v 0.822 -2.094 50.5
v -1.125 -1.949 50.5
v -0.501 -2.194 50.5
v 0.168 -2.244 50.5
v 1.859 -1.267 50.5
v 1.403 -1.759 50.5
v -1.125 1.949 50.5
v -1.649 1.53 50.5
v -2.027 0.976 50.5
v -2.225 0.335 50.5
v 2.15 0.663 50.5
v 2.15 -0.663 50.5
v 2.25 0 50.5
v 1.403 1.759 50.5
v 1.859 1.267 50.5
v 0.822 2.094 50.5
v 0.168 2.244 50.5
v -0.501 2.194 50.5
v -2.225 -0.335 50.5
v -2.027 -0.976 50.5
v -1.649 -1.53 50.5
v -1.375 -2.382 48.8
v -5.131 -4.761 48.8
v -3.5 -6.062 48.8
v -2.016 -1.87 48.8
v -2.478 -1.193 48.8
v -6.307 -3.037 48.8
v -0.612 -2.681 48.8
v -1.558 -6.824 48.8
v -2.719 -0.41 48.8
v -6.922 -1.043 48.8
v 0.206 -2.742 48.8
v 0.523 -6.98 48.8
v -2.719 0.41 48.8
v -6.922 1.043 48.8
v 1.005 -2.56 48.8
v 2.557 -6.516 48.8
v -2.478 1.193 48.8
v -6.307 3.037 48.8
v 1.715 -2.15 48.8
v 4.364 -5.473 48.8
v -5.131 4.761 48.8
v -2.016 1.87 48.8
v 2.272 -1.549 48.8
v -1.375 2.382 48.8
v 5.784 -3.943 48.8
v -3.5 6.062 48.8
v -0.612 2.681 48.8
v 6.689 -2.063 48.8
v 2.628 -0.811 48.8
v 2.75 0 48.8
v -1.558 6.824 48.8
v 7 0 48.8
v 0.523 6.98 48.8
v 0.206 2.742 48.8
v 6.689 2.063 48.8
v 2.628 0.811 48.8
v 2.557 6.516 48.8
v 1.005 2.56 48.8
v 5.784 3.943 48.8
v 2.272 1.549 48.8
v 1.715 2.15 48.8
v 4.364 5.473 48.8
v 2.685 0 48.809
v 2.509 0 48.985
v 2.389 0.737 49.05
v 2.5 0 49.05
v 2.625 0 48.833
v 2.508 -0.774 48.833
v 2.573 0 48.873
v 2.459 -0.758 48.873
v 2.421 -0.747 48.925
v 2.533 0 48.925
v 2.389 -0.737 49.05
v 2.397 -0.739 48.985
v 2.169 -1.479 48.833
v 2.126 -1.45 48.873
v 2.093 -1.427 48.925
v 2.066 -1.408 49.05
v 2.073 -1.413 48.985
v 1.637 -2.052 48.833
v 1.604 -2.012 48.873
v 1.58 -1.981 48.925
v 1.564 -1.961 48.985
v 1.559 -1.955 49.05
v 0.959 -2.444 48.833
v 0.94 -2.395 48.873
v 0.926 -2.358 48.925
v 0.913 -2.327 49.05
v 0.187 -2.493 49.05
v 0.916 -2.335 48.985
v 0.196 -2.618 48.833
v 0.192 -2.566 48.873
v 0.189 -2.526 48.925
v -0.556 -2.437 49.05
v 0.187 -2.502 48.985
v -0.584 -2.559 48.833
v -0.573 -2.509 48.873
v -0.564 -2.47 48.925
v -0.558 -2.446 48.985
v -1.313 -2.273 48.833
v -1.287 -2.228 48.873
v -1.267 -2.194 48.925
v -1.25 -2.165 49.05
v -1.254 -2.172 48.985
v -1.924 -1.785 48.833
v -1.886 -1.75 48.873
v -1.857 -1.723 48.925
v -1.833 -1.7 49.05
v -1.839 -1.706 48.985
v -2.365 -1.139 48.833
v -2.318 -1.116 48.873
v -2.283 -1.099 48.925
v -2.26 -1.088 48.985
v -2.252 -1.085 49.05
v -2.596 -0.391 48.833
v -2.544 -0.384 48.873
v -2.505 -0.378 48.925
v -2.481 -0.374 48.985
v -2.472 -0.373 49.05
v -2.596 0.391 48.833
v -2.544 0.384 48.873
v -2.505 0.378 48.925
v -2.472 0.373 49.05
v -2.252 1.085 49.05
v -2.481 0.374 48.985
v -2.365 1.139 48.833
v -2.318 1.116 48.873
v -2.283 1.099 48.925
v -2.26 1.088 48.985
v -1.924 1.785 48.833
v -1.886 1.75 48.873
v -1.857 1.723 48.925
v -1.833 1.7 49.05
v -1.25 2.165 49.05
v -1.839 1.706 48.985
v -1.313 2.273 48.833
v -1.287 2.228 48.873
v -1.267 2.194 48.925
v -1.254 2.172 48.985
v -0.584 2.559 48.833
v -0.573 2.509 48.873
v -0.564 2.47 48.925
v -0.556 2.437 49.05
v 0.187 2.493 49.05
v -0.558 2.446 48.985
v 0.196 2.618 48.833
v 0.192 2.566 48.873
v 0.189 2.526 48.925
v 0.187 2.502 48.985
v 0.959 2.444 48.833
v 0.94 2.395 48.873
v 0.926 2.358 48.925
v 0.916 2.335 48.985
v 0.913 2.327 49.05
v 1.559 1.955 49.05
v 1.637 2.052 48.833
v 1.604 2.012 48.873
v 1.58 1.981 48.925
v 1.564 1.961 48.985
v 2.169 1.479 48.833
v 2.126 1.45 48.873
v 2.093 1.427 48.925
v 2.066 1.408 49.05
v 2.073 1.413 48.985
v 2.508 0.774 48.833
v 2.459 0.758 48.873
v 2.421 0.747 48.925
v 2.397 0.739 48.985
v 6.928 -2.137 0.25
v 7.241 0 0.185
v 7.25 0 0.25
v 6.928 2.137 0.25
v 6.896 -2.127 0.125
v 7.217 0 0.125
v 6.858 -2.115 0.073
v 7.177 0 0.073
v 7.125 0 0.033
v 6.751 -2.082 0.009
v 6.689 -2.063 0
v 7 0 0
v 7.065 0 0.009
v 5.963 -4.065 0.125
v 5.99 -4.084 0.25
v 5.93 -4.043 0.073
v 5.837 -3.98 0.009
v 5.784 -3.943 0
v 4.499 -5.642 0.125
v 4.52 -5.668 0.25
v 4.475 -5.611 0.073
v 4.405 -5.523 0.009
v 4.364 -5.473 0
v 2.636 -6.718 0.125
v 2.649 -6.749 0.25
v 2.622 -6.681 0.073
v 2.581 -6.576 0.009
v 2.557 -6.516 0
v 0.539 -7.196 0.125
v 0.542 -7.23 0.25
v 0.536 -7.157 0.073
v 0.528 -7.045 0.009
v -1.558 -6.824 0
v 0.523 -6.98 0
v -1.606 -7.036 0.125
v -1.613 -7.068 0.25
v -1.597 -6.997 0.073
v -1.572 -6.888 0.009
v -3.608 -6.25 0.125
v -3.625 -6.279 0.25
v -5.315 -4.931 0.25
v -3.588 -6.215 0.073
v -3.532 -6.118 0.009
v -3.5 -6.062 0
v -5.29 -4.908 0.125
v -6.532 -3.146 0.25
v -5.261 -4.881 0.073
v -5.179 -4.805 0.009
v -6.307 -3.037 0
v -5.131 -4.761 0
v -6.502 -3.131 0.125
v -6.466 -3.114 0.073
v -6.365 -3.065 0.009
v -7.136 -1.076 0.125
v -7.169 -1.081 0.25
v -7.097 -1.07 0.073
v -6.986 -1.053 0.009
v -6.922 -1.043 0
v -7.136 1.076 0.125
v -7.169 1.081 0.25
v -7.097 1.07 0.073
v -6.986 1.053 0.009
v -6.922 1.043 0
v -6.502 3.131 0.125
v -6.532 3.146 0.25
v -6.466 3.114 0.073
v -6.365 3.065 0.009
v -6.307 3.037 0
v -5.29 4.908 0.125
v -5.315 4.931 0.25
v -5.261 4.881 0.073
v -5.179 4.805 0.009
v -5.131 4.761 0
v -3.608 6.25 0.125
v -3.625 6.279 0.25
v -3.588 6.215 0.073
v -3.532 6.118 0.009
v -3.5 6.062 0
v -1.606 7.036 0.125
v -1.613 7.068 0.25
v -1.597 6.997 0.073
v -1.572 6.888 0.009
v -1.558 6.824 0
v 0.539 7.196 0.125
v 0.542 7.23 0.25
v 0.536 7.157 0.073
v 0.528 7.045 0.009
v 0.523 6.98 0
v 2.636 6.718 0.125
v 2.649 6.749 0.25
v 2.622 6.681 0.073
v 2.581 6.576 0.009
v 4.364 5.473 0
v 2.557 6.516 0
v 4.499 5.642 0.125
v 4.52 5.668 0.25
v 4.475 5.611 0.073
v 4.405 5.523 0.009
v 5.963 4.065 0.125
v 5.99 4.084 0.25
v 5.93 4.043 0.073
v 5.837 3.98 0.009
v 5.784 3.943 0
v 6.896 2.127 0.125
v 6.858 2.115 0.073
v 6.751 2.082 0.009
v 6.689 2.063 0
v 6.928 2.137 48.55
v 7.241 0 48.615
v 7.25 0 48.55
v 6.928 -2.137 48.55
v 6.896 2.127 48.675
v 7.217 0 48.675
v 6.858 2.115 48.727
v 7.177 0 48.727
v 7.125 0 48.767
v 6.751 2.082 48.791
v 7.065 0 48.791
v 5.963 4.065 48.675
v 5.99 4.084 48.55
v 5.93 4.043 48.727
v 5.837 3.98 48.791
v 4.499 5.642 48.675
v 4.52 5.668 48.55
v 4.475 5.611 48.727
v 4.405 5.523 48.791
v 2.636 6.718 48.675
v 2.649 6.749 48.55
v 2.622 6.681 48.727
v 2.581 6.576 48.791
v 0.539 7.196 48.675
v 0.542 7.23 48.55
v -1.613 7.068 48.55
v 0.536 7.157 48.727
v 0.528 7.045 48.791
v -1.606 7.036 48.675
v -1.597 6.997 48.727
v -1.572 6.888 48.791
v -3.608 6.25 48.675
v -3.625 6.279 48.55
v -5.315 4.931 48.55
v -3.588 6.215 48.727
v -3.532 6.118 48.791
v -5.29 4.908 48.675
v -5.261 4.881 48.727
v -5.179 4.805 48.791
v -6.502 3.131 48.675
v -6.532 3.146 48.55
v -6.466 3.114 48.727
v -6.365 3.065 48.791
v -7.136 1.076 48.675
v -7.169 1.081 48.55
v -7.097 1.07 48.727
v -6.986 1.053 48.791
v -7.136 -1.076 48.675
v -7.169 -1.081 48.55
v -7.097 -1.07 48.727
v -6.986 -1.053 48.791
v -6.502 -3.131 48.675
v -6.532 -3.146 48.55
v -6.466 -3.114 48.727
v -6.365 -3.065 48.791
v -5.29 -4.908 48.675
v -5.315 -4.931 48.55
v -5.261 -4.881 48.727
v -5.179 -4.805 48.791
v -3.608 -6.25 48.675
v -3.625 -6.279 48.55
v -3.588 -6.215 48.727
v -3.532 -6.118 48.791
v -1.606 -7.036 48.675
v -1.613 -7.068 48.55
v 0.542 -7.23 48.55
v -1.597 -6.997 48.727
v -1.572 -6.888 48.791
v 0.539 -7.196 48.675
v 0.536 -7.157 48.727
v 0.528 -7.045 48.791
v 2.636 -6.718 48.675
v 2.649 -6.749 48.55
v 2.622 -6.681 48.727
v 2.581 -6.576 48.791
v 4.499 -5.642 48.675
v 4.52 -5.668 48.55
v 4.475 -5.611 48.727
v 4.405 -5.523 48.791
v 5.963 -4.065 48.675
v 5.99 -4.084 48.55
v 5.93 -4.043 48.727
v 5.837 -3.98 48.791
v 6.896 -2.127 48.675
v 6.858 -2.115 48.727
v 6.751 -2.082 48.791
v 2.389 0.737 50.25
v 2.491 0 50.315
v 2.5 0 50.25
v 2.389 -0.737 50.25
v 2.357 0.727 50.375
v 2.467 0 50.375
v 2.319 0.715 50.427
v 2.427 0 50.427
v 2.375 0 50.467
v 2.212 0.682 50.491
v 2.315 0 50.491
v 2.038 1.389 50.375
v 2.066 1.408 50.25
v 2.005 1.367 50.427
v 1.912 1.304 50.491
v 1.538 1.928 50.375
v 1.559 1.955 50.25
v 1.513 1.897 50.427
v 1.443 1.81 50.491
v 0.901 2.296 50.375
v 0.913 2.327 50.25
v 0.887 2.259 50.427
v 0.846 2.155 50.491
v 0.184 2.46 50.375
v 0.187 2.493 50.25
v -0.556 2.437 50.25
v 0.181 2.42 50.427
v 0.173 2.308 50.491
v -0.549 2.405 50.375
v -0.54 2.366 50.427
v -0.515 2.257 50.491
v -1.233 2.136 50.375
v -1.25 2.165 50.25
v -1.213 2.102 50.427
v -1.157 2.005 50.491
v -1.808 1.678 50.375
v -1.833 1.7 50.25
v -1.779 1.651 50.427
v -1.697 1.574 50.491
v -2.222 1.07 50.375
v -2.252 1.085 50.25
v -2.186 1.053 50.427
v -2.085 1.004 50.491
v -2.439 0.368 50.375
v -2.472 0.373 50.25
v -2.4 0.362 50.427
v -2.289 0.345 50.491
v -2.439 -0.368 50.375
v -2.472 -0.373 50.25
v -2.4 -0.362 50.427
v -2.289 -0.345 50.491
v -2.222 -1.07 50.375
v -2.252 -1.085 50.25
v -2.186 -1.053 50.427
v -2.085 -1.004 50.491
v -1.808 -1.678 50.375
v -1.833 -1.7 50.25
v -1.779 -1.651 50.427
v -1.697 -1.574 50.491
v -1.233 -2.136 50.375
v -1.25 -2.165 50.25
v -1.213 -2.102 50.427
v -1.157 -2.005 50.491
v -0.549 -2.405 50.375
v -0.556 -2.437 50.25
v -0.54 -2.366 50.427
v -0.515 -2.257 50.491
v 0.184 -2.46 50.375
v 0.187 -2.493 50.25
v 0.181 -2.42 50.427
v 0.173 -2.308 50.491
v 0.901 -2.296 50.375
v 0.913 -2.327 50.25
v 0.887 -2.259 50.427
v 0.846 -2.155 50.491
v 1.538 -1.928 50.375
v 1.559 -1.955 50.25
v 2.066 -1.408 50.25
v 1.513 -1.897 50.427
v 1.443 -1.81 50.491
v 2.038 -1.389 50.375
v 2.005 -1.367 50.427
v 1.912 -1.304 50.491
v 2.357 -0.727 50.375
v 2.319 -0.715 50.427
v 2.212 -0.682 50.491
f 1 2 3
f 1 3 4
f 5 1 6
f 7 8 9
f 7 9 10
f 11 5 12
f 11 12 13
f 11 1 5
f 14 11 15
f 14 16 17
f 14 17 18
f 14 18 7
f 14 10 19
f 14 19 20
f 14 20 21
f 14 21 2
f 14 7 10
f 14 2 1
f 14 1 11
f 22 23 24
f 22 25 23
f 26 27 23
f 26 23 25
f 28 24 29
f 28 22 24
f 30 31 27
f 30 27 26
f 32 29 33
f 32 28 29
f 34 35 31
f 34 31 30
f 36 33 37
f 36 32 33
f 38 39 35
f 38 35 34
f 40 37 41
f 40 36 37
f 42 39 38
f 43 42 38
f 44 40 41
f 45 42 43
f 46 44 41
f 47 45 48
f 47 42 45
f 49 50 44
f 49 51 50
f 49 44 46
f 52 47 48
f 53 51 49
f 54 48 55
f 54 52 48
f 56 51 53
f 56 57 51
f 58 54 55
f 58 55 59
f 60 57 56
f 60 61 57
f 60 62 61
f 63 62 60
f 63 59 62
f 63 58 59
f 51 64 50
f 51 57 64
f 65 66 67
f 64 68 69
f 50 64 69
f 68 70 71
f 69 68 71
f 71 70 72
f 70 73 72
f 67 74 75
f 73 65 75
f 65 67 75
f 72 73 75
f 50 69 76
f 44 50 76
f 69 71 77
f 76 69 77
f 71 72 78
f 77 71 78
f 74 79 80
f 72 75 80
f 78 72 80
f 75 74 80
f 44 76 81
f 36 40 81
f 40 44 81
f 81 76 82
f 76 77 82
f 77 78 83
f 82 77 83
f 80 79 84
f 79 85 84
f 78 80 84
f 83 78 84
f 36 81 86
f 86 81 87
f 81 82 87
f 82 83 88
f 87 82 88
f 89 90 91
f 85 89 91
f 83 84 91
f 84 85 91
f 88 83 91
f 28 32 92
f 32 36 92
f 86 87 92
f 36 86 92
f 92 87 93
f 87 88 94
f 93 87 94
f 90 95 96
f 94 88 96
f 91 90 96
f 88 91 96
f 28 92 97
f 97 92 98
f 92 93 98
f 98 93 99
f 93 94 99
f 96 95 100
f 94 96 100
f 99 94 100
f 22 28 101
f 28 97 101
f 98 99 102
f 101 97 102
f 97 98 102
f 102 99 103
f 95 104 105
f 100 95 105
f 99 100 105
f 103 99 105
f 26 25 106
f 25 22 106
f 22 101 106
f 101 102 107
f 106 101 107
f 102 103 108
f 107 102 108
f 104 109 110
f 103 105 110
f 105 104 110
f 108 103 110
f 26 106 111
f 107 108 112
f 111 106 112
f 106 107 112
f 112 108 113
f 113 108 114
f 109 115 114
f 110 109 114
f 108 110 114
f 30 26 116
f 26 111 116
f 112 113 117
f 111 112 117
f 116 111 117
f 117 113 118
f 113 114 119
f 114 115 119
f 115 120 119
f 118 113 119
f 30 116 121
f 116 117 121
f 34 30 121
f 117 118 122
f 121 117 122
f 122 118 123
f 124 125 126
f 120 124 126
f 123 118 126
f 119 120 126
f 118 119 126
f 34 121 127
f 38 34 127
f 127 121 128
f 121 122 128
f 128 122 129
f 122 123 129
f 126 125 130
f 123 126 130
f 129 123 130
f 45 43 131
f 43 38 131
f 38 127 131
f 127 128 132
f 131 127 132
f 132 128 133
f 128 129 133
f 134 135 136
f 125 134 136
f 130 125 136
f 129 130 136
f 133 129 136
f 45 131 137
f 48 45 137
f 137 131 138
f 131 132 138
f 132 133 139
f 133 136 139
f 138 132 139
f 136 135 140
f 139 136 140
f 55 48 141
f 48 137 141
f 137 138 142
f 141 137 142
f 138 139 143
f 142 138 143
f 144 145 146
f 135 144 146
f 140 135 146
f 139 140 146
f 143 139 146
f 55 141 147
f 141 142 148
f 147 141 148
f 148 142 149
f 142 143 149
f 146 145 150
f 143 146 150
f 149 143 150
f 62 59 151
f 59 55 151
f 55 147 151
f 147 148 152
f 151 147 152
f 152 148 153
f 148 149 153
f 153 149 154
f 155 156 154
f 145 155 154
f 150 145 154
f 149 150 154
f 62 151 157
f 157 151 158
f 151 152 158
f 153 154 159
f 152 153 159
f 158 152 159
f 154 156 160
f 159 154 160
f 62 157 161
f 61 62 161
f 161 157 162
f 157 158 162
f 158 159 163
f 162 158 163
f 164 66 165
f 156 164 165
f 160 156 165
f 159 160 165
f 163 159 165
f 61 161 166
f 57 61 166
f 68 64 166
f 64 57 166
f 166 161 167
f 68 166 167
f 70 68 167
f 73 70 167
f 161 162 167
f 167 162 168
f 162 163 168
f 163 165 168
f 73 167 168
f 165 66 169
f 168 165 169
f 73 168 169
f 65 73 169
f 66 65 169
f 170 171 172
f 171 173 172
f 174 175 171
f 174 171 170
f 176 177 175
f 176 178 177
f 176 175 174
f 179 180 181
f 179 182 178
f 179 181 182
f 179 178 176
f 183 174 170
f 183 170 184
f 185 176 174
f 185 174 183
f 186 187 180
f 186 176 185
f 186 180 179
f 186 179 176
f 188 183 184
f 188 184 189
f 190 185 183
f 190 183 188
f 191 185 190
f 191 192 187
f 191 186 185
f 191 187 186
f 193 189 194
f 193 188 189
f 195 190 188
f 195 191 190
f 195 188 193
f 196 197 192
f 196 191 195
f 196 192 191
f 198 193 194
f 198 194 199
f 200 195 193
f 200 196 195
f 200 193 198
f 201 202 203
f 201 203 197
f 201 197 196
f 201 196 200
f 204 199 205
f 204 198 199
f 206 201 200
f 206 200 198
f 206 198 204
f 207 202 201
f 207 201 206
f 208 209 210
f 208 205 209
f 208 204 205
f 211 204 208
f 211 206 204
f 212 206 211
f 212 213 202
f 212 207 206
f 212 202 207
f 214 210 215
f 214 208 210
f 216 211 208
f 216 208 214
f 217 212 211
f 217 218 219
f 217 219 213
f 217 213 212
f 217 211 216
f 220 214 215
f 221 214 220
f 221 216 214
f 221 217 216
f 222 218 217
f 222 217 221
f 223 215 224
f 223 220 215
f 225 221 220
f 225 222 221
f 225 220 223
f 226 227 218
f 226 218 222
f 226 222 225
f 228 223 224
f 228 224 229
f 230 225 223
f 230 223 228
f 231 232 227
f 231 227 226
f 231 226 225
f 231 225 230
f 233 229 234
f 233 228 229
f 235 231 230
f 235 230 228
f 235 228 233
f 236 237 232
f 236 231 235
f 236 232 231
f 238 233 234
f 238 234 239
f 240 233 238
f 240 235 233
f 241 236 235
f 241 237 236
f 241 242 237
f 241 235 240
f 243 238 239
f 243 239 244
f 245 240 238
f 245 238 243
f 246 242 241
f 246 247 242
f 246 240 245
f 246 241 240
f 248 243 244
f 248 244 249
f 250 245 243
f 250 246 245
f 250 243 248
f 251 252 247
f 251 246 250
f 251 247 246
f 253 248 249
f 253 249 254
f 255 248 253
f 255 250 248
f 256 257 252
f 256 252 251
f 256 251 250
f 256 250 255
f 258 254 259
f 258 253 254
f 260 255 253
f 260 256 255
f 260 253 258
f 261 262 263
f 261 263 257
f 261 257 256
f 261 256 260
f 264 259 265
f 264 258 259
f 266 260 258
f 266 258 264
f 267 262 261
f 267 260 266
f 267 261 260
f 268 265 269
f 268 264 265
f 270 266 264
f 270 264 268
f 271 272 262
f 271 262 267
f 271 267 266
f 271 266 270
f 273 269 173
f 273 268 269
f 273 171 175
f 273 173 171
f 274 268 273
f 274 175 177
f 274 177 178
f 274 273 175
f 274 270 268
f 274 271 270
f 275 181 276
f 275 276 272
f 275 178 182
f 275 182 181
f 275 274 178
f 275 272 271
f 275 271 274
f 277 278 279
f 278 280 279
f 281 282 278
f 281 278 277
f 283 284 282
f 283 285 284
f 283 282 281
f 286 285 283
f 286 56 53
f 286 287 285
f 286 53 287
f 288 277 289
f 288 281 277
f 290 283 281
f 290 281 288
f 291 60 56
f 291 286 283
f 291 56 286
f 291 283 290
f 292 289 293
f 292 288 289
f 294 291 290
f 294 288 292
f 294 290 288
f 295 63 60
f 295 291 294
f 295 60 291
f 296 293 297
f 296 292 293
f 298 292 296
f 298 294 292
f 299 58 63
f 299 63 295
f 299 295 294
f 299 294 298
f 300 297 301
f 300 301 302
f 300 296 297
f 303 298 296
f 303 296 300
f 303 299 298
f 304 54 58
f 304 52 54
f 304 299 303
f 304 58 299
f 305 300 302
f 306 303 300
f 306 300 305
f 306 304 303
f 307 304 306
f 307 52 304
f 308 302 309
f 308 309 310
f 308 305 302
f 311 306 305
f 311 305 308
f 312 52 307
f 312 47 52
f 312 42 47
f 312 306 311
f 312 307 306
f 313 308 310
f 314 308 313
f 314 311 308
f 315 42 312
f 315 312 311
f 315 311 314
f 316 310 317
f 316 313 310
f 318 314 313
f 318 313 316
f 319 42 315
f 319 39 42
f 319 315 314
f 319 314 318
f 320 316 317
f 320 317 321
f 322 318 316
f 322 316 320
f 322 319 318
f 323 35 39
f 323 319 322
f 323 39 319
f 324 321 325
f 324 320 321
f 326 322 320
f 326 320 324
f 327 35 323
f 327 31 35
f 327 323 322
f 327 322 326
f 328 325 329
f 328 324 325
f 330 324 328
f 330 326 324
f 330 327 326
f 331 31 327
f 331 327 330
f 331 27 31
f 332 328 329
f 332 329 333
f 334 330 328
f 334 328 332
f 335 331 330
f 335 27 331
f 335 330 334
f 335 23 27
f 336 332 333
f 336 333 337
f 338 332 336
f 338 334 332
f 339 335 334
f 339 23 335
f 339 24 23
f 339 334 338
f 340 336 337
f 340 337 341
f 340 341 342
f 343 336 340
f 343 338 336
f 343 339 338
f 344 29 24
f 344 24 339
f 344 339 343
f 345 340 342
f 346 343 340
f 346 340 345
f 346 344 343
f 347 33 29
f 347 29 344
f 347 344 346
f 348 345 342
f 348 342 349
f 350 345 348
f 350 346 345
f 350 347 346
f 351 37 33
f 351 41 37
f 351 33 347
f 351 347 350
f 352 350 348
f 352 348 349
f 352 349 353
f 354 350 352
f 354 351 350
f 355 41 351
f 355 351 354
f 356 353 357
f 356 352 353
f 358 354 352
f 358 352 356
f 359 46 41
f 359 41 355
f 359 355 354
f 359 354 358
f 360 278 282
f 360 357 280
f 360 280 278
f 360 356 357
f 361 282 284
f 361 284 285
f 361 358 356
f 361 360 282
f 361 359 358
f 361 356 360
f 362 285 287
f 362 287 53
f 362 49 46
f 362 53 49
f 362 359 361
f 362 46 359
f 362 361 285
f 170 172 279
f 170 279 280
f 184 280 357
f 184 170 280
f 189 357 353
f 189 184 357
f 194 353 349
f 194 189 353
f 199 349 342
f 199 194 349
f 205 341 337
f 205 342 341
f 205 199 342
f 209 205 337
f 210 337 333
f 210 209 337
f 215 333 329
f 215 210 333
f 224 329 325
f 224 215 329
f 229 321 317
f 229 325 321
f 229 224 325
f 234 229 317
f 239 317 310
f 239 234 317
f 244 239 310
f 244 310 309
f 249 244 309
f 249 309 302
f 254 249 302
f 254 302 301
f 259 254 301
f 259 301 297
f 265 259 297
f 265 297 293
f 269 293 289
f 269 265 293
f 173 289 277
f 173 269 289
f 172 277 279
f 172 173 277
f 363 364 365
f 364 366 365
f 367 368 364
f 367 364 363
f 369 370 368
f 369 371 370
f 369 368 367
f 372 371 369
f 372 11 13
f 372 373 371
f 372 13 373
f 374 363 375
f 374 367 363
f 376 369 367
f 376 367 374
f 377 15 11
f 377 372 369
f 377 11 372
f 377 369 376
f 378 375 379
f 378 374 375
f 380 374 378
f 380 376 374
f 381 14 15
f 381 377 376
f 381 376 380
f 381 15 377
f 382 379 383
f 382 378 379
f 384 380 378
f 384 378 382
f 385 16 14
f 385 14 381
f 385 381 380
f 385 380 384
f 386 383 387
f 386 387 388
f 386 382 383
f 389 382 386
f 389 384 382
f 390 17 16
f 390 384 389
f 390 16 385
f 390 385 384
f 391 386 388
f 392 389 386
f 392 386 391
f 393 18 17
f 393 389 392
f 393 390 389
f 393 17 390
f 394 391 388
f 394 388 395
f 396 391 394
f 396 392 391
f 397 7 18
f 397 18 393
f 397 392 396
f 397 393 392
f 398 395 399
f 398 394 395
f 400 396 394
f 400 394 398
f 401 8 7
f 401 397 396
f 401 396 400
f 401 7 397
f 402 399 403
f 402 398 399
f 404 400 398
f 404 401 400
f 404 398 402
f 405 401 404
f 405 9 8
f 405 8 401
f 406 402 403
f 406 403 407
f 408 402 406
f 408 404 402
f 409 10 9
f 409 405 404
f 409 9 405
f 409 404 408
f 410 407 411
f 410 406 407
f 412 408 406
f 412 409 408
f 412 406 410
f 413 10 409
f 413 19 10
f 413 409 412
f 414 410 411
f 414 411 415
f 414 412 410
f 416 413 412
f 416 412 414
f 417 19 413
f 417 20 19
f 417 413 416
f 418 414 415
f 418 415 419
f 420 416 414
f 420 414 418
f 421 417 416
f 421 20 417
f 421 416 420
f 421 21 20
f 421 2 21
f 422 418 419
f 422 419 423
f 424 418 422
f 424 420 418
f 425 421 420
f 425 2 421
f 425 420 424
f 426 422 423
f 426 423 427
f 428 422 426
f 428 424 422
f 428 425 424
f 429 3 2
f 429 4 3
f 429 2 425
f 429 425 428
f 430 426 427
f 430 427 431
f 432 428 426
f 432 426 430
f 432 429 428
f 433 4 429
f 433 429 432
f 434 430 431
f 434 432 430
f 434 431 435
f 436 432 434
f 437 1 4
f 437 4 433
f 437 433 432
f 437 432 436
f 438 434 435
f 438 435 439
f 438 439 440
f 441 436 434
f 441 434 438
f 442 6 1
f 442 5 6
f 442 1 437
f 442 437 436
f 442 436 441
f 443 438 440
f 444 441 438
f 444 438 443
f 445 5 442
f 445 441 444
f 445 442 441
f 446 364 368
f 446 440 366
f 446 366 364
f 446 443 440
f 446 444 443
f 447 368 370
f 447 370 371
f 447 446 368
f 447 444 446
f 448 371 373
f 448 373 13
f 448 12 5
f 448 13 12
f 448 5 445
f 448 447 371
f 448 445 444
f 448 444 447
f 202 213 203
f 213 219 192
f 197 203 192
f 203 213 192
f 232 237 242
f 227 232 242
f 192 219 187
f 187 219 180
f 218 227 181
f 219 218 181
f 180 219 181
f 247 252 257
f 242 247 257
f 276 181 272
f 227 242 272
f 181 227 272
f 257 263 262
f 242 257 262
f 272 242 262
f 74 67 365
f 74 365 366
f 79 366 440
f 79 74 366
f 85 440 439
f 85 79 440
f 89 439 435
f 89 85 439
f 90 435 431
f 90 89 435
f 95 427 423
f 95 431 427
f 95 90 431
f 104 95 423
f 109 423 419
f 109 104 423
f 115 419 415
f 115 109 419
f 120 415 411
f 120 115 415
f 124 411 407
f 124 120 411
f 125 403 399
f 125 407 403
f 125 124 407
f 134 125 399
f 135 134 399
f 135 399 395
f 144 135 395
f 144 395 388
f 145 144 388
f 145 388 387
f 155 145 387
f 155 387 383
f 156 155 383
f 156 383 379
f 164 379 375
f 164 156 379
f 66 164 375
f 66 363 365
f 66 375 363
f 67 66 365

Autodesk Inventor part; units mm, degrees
ref_plane "YZ Plane" through (0, 0, 0) normal (1, 0, 0) x (0, 1, 0)
ref_plane "XZ Plane" through (0, 0, 0) normal (0, 1, 0) x (-1, 0, 0)
ref_plane "XY Plane" through (0, 0, 0) normal (0, 0, 1) x (1, 0, 0)
sketch "スケッチ1" plane through (0, 0, 0) normal (0, 0, 1) x (1, 0, 0)
  circle A0 centre (0, 0) radius 7.25
  dimension "d0" = 14.5
extrude "押し出し1" add sketch "スケッチ1" along normal blind 48.8
sketch "スケッチ2" plane through (0, 0, 48.8) normal (0, 0, 1) x (1, 0, 0)
  circle A0 centre (0, 0) radius 2.5
  dimension "d3" = 5
extrude "押し出し2" add sketch "スケッチ2" along normal blind 1.7
fillet "フィレット1" radius 0.25 4 edges at (-7.25, 0, 48.8) (-7.25, 0, 0) (-2.5, 0, 50.5) (-2.5, 0, 48.8)
properties part number "battery"
